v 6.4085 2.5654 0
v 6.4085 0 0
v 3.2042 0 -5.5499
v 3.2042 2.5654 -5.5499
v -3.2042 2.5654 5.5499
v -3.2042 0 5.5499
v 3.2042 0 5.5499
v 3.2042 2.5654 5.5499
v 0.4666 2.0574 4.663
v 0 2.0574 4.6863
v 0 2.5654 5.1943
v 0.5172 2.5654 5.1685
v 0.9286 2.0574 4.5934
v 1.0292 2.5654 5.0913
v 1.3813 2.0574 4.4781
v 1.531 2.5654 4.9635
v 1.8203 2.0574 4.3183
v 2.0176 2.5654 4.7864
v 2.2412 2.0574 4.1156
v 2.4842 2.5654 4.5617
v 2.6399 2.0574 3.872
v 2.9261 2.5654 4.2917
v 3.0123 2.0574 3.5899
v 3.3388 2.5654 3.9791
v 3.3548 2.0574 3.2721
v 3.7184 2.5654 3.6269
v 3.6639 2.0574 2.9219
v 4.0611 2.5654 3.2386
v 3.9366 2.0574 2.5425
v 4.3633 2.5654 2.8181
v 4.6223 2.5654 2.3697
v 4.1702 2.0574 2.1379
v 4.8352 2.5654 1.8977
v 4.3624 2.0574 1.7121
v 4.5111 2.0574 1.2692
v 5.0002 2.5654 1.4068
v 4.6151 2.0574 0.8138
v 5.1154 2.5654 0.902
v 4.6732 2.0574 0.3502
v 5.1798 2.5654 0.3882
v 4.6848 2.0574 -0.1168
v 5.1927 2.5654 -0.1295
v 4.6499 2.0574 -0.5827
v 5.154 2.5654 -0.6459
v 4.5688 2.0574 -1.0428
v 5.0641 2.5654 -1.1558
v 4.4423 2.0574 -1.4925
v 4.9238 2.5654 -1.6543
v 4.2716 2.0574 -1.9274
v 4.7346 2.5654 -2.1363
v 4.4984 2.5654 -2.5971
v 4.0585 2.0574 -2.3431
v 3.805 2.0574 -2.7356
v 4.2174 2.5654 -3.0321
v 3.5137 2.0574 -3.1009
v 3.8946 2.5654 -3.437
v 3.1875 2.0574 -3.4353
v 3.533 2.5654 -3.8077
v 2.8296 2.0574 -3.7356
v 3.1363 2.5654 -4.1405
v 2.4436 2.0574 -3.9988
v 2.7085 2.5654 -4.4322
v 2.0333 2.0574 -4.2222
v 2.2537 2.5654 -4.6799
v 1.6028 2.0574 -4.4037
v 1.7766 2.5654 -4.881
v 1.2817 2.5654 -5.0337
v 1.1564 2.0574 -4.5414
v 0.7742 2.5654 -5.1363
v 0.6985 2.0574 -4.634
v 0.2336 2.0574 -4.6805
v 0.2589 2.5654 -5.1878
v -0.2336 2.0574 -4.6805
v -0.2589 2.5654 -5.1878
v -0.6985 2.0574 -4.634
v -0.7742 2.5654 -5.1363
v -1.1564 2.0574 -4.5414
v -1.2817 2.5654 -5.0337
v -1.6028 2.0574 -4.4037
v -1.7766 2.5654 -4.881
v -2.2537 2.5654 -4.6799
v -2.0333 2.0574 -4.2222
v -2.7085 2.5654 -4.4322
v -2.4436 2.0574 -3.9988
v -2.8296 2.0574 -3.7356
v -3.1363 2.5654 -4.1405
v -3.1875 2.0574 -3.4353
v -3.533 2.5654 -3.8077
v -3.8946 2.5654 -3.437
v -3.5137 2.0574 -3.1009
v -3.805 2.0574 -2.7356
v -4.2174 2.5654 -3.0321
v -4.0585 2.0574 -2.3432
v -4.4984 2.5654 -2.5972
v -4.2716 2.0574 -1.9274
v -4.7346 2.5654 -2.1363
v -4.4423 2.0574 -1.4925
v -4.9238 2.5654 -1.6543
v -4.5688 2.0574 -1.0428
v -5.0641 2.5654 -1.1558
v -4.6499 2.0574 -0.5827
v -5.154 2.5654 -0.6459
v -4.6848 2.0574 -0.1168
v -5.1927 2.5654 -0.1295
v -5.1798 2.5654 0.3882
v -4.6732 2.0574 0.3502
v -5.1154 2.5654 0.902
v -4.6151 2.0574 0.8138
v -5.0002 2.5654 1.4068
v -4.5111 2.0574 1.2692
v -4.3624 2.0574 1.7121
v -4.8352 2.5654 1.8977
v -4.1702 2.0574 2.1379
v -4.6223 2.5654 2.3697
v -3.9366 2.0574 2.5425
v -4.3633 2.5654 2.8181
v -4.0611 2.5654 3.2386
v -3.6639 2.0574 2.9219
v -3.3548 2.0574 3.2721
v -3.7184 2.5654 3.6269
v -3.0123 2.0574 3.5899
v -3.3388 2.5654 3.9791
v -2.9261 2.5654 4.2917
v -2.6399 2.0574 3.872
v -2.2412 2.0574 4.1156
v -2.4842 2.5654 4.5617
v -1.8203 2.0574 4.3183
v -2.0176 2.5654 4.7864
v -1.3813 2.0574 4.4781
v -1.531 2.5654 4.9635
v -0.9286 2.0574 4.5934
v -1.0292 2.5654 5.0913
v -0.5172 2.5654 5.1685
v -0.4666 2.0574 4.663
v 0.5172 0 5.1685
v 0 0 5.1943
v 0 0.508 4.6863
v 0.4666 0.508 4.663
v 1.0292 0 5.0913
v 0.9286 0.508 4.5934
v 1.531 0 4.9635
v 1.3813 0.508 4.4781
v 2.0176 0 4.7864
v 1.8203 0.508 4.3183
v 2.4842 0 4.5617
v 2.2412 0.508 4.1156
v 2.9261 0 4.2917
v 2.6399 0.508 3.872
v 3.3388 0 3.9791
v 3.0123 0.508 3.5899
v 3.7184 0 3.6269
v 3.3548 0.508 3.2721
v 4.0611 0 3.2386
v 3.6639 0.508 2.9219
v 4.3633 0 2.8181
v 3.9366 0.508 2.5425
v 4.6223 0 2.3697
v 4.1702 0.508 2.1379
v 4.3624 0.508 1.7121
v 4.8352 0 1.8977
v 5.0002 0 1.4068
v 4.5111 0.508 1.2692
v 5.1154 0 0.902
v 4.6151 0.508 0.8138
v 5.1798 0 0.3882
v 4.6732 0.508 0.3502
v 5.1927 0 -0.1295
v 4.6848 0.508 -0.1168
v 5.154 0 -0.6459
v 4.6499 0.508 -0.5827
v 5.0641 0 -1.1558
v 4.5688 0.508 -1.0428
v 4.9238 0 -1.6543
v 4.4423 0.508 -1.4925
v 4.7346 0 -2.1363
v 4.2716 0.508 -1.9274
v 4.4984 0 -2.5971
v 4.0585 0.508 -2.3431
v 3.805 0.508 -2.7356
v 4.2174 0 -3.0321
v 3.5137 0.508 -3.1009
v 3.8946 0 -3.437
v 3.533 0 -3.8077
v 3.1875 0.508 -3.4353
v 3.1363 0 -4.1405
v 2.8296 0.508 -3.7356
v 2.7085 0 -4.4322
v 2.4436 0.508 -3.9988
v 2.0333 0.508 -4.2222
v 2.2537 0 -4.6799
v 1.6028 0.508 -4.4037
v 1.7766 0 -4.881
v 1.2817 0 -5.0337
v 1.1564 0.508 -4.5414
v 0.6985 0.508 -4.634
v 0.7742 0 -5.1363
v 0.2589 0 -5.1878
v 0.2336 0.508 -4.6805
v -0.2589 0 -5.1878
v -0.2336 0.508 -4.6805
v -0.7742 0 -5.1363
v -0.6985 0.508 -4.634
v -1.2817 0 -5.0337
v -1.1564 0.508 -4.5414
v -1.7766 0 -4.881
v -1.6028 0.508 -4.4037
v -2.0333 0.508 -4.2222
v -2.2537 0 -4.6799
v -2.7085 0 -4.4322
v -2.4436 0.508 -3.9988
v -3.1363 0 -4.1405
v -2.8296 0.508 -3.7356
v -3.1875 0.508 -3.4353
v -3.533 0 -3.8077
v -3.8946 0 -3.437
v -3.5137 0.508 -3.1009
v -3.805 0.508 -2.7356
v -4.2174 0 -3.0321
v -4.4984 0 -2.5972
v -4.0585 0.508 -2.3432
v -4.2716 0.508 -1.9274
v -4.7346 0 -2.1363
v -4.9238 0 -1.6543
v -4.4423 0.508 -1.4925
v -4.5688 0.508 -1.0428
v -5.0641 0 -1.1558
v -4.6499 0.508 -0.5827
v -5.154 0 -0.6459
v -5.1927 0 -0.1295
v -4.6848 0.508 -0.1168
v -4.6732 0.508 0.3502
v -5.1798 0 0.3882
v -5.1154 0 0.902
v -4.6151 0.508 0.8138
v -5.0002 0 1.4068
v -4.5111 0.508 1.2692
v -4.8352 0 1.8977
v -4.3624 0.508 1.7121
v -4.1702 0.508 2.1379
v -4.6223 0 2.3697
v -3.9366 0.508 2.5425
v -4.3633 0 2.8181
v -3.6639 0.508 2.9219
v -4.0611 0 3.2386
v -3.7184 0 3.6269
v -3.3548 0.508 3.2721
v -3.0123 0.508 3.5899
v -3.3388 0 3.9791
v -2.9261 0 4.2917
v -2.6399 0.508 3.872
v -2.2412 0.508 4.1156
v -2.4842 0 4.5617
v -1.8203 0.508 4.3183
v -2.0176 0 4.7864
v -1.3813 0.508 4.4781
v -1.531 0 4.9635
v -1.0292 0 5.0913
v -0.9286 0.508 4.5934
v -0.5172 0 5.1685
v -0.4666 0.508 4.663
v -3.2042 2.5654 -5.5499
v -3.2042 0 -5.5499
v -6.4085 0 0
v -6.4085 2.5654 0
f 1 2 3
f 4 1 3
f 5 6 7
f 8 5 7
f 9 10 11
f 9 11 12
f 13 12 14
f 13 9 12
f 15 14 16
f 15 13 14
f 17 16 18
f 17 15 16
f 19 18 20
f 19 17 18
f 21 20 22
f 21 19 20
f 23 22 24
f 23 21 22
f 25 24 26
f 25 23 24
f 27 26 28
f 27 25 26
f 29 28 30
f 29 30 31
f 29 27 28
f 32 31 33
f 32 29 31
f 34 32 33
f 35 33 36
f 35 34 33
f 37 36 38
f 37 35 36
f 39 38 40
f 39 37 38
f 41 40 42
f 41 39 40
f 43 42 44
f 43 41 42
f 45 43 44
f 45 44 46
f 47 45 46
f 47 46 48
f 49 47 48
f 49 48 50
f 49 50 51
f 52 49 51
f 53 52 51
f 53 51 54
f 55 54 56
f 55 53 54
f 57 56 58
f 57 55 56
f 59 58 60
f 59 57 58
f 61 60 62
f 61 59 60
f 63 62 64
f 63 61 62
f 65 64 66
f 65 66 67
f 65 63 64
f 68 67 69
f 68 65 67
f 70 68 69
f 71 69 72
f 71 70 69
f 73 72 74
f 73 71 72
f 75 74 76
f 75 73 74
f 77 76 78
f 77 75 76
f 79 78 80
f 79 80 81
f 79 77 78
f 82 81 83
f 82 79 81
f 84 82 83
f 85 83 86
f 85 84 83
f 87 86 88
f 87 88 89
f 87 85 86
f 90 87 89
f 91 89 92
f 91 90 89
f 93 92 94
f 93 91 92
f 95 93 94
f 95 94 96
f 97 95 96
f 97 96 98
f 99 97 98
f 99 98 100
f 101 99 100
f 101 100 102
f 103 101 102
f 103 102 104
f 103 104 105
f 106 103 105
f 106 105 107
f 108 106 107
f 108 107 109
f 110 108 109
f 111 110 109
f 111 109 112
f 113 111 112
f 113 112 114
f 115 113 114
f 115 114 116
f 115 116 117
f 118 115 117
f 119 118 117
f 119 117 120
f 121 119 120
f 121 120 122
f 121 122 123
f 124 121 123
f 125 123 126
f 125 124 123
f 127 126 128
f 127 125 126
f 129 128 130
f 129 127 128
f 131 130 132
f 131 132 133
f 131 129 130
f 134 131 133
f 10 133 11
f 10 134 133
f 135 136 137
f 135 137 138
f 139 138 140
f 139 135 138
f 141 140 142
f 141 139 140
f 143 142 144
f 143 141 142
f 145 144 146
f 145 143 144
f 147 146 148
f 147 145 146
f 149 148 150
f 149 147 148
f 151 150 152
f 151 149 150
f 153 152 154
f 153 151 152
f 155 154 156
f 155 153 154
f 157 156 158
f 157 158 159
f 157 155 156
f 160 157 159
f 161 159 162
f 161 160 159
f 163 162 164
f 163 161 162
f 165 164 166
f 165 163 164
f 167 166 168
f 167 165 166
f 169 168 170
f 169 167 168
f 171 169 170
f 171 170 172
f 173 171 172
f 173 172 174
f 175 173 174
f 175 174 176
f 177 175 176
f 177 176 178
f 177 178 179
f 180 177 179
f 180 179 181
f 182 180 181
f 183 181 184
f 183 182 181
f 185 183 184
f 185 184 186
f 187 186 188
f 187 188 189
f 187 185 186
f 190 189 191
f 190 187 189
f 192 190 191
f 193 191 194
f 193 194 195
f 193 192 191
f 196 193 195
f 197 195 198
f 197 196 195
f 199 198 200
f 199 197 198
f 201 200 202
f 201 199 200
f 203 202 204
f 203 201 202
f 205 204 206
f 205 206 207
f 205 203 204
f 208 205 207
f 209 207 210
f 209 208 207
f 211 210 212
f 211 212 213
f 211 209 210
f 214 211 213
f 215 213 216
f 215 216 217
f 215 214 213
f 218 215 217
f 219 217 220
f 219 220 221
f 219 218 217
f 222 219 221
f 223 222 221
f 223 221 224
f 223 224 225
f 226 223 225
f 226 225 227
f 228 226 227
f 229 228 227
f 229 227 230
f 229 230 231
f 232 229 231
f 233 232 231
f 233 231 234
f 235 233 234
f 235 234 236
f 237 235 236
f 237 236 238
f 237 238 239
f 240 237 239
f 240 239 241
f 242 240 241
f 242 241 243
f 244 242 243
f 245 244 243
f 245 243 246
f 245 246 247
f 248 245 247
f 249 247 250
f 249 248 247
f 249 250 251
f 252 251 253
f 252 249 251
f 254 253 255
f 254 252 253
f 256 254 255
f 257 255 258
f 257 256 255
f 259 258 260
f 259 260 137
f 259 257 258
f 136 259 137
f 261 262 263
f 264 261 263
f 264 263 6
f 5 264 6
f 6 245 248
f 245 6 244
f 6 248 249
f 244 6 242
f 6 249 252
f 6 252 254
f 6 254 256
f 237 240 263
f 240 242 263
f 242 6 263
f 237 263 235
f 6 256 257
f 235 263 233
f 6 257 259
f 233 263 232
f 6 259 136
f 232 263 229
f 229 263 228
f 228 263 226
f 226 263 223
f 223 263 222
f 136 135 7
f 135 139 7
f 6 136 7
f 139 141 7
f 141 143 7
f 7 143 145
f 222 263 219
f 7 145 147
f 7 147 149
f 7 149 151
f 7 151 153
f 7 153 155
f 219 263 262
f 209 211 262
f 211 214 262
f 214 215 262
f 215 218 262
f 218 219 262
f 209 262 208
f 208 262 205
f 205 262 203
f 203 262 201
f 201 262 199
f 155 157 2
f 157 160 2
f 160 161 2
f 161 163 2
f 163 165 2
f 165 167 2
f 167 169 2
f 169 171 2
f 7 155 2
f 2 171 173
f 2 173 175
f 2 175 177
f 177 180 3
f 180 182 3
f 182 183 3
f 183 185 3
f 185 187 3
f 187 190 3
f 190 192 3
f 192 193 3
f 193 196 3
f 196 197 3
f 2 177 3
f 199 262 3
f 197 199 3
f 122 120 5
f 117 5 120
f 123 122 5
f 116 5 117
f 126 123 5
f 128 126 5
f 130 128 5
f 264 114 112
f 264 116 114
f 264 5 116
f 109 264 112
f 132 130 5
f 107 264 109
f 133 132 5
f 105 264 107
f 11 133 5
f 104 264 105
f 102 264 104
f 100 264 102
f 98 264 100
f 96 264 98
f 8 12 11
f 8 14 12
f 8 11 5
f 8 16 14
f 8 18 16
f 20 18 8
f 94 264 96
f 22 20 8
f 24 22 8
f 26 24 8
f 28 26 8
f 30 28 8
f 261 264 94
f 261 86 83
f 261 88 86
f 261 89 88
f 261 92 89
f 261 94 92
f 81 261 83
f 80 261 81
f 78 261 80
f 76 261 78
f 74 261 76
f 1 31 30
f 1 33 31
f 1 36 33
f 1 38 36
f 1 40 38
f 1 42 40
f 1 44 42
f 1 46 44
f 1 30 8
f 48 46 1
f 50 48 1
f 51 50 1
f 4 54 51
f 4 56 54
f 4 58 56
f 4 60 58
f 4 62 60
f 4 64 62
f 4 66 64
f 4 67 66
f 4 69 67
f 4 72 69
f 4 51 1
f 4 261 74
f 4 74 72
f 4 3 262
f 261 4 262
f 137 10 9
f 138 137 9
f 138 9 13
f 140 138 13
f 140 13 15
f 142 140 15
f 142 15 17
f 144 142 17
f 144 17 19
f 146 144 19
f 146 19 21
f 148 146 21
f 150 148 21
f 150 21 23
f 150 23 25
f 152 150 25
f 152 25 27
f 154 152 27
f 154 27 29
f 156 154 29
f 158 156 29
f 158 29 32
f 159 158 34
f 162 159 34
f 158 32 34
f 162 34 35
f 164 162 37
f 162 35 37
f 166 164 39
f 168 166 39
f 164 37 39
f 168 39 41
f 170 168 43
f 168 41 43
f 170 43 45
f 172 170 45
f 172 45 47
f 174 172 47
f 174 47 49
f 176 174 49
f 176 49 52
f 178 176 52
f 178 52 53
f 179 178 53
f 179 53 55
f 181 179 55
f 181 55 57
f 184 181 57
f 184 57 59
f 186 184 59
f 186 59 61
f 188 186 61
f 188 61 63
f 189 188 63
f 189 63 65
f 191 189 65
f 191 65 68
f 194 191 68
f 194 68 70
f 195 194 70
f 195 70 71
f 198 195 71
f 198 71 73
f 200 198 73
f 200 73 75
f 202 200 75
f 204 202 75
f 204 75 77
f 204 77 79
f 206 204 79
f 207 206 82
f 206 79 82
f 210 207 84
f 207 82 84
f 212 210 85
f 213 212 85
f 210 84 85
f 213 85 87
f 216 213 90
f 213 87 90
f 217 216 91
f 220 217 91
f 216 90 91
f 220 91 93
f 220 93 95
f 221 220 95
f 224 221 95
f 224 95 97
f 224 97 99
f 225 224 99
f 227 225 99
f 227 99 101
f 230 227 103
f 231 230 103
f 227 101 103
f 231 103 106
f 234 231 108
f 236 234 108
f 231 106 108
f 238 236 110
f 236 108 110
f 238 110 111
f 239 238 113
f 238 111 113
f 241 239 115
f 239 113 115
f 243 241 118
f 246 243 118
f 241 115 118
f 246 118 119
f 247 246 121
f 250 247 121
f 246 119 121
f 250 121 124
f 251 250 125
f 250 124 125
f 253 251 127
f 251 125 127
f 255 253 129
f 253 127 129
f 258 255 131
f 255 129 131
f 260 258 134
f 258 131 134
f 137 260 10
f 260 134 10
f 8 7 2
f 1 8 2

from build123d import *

# Parameters (mm, degrees)
BOSS_EXTRUDE1_DEPTH = 2.5654
SKETCH7_R           = 4.6863
CUT_EXTRUDE1_DEPTH  = 9.857267478
FILLET1_SIZE        = 0.508
FILLET2_SIZE        = 0.508


with BuildPart() as part:
    # Sketch4 → Boss-Extrude1 (new body)
    with BuildSketch(Plane(origin=(0, 0, 0), x_dir=(1, 0, 0), z_dir=(0, 1, 0))):
        Polygon((6.408472518, 0), (3.204236259, 5.5499), (-3.204236259, 5.5499), (-6.408472518, 0), (-3.204236259, -5.5499), (3.204236259, -5.5499), align=None)
    extrude(amount=BOSS_EXTRUDE1_DEPTH)

    # Sketch7 → Cut-Extrude1 (cut, through all)
    with BuildSketch(Plane(origin=(0, 2.5654, 0), x_dir=(1, 0, 0), z_dir=(0, 1, 0))):
        Circle(SKETCH7_R)
    extrude(amount=-CUT_EXTRUDE1_DEPTH, mode=Mode.SUBTRACT)

    # Fillet1
    fillet1_edges = [part.edges().sort_by_distance(p)[0] for p in [
        (-4.6863, 2.5654, 0),
    ]]
    chamfer(fillet1_edges, length=FILLET1_SIZE)

    # Fillet2
    fillet2_edges = [part.edges().sort_by_distance(p)[0] for p in [
        (-4.6863, 0, 0),
    ]]
    chamfer(fillet2_edges, length=FILLET2_SIZE)


solid = part.part
